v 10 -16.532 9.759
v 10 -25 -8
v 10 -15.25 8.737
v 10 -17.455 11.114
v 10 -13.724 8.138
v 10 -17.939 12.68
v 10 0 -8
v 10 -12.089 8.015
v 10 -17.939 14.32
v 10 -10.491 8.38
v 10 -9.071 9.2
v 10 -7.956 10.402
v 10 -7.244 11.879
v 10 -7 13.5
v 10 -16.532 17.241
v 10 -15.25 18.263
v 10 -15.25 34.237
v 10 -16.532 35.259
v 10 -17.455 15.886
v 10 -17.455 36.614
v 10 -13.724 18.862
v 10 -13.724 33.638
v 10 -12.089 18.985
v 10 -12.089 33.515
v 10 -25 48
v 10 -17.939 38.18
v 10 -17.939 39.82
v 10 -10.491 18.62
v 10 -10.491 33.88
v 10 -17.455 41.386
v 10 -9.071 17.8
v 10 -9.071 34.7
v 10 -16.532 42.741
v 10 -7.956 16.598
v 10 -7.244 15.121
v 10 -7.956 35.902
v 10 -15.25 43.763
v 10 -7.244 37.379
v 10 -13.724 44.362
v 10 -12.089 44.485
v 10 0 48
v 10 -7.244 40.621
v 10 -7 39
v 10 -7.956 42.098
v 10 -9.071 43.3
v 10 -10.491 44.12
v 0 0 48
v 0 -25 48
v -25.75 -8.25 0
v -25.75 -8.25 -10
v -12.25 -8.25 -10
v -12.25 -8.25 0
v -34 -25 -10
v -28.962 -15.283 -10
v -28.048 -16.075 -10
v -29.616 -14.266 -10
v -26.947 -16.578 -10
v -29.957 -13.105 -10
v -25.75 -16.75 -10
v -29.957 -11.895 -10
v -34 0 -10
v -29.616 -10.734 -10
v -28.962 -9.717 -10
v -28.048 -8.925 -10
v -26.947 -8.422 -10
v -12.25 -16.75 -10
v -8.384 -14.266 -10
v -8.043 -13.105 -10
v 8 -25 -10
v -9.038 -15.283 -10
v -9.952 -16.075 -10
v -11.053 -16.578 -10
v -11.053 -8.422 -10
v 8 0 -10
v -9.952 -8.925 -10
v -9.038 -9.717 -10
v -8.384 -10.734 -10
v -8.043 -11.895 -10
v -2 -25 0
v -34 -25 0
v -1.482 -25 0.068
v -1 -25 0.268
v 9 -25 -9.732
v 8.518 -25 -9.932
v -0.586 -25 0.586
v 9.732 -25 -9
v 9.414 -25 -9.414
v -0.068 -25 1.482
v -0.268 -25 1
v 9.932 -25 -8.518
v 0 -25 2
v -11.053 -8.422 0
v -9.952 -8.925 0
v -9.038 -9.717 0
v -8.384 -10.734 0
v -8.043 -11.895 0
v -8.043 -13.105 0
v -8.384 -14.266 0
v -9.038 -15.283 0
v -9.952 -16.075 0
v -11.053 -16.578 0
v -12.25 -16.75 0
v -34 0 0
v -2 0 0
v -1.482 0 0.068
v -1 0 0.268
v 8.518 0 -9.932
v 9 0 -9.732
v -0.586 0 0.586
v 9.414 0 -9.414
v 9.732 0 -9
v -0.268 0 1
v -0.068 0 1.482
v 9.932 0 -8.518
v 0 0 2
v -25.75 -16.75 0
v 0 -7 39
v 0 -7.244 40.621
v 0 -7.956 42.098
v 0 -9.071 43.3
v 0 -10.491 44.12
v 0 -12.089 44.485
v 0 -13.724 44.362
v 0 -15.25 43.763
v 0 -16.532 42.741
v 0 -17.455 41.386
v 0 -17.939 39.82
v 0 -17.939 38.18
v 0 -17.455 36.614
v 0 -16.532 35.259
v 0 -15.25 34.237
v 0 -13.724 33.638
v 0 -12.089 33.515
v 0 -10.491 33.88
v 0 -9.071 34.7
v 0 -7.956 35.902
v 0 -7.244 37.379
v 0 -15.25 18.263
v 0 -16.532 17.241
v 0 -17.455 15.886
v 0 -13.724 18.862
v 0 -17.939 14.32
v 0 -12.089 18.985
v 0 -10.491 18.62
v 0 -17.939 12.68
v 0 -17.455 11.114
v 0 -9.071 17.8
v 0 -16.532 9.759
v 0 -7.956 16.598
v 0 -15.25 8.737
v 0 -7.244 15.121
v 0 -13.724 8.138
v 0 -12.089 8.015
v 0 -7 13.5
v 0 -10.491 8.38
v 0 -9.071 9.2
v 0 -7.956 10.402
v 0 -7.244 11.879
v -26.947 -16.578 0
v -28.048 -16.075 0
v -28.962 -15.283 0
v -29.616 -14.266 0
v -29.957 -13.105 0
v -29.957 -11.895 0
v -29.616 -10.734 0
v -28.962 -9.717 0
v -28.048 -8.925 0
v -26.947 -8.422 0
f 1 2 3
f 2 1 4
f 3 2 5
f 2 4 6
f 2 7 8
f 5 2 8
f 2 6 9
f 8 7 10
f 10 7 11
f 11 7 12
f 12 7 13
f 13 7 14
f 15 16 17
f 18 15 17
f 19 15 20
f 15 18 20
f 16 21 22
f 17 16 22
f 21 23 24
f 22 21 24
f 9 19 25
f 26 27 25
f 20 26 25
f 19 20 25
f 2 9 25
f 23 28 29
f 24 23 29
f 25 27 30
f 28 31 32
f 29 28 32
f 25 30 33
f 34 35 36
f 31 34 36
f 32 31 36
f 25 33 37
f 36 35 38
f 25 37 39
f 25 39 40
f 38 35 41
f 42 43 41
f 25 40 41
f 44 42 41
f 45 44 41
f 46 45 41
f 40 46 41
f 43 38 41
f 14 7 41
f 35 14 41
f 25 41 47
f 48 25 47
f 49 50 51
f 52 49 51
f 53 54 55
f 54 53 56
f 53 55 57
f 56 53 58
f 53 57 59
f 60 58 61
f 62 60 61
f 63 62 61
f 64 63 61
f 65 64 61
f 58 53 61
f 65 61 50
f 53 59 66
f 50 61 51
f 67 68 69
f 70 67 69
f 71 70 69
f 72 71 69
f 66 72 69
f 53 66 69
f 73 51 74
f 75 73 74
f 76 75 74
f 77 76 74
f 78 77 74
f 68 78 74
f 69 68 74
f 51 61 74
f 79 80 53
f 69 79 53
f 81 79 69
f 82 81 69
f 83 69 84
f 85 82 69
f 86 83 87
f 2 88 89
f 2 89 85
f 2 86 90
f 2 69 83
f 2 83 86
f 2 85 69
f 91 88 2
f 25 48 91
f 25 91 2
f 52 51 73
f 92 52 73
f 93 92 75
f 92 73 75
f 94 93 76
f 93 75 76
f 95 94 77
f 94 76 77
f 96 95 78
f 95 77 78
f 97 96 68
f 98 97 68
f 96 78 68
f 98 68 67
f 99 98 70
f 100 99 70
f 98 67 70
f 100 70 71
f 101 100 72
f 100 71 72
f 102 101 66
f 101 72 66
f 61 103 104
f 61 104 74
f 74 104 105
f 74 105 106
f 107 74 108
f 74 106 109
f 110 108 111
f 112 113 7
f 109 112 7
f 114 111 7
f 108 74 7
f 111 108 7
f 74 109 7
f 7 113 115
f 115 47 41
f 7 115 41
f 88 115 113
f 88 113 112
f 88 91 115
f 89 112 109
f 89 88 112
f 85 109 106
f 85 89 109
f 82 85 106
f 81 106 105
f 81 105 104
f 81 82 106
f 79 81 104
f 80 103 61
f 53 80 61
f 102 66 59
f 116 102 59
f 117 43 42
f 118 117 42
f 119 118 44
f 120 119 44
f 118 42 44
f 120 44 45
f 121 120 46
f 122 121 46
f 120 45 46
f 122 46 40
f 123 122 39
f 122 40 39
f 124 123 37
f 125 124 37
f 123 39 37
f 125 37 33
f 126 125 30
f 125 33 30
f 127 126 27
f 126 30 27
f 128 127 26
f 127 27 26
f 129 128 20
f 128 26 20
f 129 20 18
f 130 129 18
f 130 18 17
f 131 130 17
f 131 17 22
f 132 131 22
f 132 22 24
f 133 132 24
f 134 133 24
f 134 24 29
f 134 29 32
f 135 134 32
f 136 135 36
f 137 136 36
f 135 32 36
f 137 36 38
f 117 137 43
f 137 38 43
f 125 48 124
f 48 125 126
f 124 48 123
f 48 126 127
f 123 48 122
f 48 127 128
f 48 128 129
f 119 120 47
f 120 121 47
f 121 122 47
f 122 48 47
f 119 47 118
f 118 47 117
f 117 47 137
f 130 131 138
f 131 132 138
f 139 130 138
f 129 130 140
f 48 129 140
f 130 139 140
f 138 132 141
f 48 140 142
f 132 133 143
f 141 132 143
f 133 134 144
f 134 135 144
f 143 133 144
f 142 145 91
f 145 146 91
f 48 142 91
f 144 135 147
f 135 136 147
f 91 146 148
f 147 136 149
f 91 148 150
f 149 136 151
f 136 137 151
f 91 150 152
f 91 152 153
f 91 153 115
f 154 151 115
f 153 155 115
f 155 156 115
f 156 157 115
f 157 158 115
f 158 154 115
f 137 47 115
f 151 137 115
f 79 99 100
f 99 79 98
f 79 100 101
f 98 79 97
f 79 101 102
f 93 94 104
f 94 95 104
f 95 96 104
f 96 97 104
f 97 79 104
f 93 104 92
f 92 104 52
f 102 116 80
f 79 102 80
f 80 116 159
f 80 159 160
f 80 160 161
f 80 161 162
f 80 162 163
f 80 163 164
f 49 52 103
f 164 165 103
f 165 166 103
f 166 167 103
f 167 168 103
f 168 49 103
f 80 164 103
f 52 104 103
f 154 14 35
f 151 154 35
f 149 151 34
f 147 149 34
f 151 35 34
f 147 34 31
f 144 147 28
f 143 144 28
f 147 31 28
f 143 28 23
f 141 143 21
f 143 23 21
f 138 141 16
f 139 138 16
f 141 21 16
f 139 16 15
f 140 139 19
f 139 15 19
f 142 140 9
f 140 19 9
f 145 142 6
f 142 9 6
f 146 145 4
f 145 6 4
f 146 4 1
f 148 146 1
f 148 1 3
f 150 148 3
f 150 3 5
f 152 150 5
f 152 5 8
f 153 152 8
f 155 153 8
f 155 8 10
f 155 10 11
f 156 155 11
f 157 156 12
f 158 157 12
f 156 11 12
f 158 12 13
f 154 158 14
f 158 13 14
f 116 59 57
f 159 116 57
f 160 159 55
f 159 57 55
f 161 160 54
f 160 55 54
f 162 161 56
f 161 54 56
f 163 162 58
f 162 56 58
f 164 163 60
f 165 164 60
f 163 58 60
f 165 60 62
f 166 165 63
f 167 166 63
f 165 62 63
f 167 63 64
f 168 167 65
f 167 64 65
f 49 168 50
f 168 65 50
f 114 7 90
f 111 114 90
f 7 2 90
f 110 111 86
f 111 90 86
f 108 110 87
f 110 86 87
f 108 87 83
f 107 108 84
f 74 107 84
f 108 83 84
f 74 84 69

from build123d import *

# Parameters (mm, degrees)
F1_DEPTH = 25
F3_DEPTH = 10
F4_R     = 5.5
F5_DEPTH = 10
F6_R     = 2
F7_R     = 2


with BuildPart() as f1:
    # F0 (on Front) → F1 (new body)
    with BuildSketch(Plane.XZ):
        Polygon((10, 48), (0, 48), (0, 0), (-34, 0), (-34, -10), (10, -10), align=None)
    extrude(amount=F1_DEPTH)

    # F2 (on face) → F3 (cut)
    with BuildSketch(Plane(origin=(0, 0, -10), x_dir=(1, 0, 0), z_dir=(0, 0, -1))):
        with BuildLine():
            Line((-12.25, 16.75), (-25.75, 16.75))
            ThreePointArc((-25.75, 16.75), (-30, 12.5), (-25.75, 8.25))
            Line((-25.75, 8.25), (-12.25, 8.25))
            ThreePointArc((-12.25, 8.25), (-8, 12.5), (-12.25, 16.75))
        make_face()
    extrude(amount=-F3_DEPTH, mode=Mode.SUBTRACT)

    # F4 (on face) → F5 (cut)
    with BuildSketch(Plane.YZ.offset(10)):
        with Locations((-12.5, 13.5)):
            Circle(F4_R)
        with Locations((-12.5, 39)):
            Circle(F4_R)
    extrude(amount=-F5_DEPTH, mode=Mode.SUBTRACT)

    # F6
    f6_edges = [f1.edges().sort_by_distance(p)[0] for p in [
        (0, -12.5, 0),
    ]]
    fillet(f6_edges, radius=F6_R)

    # F7
    f7_edges = [f1.edges().sort_by_distance(p)[0] for p in [
        (10, -12.5, -10),
    ]]
    fillet(f7_edges, radius=F7_R)


solid = f1.part
